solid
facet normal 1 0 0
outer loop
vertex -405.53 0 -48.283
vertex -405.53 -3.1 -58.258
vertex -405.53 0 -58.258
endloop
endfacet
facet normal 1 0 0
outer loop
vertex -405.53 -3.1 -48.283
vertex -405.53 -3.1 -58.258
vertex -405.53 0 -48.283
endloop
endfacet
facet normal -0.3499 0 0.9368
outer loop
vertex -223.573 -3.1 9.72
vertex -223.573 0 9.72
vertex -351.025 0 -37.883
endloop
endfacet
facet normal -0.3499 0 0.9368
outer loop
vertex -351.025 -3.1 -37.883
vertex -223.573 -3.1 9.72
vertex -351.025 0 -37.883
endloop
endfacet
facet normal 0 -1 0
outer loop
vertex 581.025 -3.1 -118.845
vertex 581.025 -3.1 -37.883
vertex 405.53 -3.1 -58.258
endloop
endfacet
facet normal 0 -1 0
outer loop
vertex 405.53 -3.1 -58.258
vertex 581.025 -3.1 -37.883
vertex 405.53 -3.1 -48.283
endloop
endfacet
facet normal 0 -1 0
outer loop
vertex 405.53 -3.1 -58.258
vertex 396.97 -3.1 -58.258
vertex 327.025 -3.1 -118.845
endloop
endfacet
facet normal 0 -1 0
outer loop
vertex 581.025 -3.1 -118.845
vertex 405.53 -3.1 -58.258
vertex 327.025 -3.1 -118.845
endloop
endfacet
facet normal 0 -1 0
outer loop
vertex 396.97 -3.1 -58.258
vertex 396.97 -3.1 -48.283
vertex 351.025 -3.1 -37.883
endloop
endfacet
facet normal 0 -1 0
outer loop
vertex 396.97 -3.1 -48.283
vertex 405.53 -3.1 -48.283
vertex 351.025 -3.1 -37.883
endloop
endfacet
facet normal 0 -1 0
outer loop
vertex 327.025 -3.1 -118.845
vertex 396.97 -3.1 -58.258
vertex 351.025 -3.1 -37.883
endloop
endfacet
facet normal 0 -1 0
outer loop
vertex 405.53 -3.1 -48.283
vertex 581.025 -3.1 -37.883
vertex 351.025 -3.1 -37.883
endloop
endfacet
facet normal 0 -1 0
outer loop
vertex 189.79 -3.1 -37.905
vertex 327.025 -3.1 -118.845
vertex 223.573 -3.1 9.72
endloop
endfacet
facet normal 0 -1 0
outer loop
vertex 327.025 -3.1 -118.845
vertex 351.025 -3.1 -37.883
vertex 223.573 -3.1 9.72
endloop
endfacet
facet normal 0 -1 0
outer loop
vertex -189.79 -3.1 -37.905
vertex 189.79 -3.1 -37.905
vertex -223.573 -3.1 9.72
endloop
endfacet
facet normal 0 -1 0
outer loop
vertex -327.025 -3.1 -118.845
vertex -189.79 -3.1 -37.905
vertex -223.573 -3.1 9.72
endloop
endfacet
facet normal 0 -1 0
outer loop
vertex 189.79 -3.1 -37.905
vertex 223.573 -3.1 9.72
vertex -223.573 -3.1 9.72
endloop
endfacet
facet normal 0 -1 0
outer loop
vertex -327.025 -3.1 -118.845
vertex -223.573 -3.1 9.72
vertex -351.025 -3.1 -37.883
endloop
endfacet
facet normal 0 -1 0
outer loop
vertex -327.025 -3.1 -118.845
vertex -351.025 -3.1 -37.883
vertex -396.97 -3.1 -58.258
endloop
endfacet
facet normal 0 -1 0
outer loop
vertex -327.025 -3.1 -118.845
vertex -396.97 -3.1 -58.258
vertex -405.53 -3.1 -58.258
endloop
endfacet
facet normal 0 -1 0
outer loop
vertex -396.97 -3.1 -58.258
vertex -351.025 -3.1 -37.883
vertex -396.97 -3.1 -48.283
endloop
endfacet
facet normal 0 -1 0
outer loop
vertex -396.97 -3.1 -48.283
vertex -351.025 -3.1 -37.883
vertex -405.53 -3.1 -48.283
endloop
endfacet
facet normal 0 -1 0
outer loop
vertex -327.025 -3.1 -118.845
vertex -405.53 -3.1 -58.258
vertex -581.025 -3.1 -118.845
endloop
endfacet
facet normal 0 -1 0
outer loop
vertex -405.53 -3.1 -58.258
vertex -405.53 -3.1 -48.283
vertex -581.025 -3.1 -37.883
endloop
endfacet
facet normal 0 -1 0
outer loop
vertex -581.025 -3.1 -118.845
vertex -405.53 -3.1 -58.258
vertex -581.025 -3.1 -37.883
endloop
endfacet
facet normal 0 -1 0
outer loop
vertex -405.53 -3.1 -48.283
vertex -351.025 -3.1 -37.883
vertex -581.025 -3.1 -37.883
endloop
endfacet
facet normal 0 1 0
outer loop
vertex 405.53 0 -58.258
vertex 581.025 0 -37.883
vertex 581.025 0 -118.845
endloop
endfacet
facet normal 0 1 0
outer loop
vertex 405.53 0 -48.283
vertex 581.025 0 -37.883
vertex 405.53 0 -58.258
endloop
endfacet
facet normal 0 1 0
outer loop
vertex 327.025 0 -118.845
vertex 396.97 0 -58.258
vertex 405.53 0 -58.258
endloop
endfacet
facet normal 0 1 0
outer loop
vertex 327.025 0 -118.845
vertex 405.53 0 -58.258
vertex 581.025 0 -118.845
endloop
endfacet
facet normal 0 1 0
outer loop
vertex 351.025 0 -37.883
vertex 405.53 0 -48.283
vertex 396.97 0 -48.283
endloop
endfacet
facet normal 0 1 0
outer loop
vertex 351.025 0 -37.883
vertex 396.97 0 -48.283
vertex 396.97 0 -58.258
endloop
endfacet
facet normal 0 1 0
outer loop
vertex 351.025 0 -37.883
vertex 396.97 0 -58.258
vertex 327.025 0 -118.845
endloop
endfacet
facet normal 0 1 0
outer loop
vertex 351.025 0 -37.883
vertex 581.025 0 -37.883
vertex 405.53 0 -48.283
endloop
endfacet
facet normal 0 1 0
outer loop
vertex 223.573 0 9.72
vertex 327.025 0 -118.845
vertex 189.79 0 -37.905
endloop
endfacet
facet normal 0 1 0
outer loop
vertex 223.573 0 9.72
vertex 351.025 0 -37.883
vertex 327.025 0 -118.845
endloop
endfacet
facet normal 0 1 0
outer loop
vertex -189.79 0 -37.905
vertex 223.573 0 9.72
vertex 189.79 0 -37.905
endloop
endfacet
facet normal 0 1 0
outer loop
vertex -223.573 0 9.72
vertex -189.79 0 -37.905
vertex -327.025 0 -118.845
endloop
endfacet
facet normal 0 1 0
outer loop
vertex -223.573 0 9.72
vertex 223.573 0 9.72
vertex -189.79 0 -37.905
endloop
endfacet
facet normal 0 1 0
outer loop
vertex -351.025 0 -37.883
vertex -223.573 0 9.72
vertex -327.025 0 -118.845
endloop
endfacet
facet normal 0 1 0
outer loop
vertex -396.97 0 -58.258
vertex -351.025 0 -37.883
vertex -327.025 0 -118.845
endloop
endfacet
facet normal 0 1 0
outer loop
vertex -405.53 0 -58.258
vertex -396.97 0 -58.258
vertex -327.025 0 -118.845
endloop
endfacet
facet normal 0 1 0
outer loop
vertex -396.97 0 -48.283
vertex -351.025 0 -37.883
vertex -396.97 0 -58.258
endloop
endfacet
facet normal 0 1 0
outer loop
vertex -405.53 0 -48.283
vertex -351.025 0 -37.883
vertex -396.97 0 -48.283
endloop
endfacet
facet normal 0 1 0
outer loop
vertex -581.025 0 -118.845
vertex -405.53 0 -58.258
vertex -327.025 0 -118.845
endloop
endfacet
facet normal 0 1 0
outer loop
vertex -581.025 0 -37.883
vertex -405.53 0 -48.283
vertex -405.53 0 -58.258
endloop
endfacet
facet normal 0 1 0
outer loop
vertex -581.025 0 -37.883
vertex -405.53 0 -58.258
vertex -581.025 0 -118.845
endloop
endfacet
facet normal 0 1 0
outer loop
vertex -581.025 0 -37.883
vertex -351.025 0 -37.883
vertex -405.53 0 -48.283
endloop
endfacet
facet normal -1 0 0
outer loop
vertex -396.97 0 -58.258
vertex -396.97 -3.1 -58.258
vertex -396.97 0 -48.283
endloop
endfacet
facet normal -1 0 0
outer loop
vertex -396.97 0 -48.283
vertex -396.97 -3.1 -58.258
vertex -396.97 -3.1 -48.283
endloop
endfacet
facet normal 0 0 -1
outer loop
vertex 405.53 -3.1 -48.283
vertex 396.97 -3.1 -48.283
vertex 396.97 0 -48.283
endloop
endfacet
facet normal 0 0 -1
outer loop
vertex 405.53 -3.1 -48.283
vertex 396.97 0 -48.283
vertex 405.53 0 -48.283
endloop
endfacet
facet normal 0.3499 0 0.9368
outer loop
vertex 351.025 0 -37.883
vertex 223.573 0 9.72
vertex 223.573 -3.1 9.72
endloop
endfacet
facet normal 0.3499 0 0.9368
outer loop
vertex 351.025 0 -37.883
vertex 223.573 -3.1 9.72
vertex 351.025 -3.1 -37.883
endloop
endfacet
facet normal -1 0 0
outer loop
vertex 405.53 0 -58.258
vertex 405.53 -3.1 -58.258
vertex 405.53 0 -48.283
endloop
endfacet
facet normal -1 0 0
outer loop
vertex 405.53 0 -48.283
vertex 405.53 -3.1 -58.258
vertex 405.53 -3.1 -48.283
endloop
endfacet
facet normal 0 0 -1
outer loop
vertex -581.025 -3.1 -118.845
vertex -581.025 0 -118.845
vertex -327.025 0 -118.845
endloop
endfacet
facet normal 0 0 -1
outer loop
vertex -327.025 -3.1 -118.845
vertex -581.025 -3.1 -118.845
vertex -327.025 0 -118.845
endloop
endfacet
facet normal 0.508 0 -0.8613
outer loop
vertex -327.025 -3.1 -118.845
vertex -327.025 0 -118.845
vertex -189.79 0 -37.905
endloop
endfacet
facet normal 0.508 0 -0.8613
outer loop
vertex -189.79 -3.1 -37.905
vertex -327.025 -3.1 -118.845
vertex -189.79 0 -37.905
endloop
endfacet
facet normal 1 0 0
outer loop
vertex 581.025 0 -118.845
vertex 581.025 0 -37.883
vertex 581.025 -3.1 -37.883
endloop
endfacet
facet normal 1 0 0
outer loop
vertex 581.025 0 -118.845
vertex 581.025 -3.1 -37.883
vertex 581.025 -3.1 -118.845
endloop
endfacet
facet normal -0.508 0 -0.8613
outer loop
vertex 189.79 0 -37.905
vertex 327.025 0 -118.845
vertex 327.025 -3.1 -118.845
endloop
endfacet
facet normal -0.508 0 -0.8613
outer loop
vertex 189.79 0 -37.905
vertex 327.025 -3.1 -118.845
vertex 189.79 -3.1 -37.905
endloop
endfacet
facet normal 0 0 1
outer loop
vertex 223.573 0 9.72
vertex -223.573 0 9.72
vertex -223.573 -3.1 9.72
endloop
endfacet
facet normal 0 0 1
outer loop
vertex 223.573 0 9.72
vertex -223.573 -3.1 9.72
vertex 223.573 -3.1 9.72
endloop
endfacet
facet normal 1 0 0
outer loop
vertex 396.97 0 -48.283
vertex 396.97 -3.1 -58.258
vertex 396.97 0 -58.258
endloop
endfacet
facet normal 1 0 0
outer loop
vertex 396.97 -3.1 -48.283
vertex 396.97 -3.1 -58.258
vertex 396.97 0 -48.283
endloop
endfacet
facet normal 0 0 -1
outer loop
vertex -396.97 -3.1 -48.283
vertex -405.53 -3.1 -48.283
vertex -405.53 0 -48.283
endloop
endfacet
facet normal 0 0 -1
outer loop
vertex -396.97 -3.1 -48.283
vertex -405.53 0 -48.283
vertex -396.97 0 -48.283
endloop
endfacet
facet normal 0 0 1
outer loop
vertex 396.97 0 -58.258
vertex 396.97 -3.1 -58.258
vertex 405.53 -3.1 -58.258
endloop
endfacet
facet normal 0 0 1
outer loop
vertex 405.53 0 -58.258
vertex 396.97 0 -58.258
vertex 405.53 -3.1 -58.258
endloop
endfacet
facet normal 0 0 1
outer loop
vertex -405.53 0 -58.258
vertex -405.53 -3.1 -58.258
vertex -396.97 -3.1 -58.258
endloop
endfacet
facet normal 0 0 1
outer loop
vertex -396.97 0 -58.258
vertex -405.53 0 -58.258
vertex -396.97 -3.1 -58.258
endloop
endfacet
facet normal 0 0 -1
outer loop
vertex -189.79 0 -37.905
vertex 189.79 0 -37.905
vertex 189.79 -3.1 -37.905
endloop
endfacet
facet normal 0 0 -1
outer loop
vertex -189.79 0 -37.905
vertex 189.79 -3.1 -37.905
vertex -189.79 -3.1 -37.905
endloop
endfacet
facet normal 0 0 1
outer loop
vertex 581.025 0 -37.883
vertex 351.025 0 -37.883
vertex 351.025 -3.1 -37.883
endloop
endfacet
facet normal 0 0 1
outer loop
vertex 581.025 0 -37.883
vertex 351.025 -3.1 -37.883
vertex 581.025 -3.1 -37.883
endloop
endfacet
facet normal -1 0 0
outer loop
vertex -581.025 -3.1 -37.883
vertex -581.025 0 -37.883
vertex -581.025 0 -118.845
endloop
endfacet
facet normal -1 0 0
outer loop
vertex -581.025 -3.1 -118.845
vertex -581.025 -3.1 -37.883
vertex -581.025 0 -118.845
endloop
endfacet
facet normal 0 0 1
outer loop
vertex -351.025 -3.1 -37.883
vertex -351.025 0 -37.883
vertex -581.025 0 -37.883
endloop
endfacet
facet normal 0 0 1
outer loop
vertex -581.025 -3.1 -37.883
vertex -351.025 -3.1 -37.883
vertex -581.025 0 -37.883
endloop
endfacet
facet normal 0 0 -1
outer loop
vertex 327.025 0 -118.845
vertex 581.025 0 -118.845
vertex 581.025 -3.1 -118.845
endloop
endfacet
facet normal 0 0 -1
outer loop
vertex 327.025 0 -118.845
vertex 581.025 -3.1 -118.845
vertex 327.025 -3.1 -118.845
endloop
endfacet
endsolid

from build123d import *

# Parameters (mm, degrees)
F1_DEPTH = 3.1
F3_W     = 8.5598
F3_H     = 9.975209
F4_DEPTH = 25.4


with BuildPart() as f1:
    # F0 (on Front) → F1 (new body)
    with BuildSketch(Plane.XZ):
        Polygon((-351.025, -37.88251), (-581.025, -37.88251), (-581.025, -118.84501), (-327.025, -118.84501), (-189.790466, -37.904931), (0, -37.904931), (0, 9.720069), (-223.572938, 9.720069), align=None)
    extrude(amount=F1_DEPTH)

    # F2: F1 across plane


with BuildPart() as f1_1:
    add(f1.part)
    add(f1.part.mirror(Plane.YZ))

    # F3 (on face) → F4 (cut)
    with BuildSketch(Plane.XZ.offset(3.1)):
        with Locations((401.249896, -53.270142)):
            Rectangle(F3_W, F3_H)
        with Locations((-401.249896, -53.270142)):
            Rectangle(F3_W, F3_H)
    extrude(amount=-F4_DEPTH, mode=Mode.SUBTRACT)


solid = f1_1.part
